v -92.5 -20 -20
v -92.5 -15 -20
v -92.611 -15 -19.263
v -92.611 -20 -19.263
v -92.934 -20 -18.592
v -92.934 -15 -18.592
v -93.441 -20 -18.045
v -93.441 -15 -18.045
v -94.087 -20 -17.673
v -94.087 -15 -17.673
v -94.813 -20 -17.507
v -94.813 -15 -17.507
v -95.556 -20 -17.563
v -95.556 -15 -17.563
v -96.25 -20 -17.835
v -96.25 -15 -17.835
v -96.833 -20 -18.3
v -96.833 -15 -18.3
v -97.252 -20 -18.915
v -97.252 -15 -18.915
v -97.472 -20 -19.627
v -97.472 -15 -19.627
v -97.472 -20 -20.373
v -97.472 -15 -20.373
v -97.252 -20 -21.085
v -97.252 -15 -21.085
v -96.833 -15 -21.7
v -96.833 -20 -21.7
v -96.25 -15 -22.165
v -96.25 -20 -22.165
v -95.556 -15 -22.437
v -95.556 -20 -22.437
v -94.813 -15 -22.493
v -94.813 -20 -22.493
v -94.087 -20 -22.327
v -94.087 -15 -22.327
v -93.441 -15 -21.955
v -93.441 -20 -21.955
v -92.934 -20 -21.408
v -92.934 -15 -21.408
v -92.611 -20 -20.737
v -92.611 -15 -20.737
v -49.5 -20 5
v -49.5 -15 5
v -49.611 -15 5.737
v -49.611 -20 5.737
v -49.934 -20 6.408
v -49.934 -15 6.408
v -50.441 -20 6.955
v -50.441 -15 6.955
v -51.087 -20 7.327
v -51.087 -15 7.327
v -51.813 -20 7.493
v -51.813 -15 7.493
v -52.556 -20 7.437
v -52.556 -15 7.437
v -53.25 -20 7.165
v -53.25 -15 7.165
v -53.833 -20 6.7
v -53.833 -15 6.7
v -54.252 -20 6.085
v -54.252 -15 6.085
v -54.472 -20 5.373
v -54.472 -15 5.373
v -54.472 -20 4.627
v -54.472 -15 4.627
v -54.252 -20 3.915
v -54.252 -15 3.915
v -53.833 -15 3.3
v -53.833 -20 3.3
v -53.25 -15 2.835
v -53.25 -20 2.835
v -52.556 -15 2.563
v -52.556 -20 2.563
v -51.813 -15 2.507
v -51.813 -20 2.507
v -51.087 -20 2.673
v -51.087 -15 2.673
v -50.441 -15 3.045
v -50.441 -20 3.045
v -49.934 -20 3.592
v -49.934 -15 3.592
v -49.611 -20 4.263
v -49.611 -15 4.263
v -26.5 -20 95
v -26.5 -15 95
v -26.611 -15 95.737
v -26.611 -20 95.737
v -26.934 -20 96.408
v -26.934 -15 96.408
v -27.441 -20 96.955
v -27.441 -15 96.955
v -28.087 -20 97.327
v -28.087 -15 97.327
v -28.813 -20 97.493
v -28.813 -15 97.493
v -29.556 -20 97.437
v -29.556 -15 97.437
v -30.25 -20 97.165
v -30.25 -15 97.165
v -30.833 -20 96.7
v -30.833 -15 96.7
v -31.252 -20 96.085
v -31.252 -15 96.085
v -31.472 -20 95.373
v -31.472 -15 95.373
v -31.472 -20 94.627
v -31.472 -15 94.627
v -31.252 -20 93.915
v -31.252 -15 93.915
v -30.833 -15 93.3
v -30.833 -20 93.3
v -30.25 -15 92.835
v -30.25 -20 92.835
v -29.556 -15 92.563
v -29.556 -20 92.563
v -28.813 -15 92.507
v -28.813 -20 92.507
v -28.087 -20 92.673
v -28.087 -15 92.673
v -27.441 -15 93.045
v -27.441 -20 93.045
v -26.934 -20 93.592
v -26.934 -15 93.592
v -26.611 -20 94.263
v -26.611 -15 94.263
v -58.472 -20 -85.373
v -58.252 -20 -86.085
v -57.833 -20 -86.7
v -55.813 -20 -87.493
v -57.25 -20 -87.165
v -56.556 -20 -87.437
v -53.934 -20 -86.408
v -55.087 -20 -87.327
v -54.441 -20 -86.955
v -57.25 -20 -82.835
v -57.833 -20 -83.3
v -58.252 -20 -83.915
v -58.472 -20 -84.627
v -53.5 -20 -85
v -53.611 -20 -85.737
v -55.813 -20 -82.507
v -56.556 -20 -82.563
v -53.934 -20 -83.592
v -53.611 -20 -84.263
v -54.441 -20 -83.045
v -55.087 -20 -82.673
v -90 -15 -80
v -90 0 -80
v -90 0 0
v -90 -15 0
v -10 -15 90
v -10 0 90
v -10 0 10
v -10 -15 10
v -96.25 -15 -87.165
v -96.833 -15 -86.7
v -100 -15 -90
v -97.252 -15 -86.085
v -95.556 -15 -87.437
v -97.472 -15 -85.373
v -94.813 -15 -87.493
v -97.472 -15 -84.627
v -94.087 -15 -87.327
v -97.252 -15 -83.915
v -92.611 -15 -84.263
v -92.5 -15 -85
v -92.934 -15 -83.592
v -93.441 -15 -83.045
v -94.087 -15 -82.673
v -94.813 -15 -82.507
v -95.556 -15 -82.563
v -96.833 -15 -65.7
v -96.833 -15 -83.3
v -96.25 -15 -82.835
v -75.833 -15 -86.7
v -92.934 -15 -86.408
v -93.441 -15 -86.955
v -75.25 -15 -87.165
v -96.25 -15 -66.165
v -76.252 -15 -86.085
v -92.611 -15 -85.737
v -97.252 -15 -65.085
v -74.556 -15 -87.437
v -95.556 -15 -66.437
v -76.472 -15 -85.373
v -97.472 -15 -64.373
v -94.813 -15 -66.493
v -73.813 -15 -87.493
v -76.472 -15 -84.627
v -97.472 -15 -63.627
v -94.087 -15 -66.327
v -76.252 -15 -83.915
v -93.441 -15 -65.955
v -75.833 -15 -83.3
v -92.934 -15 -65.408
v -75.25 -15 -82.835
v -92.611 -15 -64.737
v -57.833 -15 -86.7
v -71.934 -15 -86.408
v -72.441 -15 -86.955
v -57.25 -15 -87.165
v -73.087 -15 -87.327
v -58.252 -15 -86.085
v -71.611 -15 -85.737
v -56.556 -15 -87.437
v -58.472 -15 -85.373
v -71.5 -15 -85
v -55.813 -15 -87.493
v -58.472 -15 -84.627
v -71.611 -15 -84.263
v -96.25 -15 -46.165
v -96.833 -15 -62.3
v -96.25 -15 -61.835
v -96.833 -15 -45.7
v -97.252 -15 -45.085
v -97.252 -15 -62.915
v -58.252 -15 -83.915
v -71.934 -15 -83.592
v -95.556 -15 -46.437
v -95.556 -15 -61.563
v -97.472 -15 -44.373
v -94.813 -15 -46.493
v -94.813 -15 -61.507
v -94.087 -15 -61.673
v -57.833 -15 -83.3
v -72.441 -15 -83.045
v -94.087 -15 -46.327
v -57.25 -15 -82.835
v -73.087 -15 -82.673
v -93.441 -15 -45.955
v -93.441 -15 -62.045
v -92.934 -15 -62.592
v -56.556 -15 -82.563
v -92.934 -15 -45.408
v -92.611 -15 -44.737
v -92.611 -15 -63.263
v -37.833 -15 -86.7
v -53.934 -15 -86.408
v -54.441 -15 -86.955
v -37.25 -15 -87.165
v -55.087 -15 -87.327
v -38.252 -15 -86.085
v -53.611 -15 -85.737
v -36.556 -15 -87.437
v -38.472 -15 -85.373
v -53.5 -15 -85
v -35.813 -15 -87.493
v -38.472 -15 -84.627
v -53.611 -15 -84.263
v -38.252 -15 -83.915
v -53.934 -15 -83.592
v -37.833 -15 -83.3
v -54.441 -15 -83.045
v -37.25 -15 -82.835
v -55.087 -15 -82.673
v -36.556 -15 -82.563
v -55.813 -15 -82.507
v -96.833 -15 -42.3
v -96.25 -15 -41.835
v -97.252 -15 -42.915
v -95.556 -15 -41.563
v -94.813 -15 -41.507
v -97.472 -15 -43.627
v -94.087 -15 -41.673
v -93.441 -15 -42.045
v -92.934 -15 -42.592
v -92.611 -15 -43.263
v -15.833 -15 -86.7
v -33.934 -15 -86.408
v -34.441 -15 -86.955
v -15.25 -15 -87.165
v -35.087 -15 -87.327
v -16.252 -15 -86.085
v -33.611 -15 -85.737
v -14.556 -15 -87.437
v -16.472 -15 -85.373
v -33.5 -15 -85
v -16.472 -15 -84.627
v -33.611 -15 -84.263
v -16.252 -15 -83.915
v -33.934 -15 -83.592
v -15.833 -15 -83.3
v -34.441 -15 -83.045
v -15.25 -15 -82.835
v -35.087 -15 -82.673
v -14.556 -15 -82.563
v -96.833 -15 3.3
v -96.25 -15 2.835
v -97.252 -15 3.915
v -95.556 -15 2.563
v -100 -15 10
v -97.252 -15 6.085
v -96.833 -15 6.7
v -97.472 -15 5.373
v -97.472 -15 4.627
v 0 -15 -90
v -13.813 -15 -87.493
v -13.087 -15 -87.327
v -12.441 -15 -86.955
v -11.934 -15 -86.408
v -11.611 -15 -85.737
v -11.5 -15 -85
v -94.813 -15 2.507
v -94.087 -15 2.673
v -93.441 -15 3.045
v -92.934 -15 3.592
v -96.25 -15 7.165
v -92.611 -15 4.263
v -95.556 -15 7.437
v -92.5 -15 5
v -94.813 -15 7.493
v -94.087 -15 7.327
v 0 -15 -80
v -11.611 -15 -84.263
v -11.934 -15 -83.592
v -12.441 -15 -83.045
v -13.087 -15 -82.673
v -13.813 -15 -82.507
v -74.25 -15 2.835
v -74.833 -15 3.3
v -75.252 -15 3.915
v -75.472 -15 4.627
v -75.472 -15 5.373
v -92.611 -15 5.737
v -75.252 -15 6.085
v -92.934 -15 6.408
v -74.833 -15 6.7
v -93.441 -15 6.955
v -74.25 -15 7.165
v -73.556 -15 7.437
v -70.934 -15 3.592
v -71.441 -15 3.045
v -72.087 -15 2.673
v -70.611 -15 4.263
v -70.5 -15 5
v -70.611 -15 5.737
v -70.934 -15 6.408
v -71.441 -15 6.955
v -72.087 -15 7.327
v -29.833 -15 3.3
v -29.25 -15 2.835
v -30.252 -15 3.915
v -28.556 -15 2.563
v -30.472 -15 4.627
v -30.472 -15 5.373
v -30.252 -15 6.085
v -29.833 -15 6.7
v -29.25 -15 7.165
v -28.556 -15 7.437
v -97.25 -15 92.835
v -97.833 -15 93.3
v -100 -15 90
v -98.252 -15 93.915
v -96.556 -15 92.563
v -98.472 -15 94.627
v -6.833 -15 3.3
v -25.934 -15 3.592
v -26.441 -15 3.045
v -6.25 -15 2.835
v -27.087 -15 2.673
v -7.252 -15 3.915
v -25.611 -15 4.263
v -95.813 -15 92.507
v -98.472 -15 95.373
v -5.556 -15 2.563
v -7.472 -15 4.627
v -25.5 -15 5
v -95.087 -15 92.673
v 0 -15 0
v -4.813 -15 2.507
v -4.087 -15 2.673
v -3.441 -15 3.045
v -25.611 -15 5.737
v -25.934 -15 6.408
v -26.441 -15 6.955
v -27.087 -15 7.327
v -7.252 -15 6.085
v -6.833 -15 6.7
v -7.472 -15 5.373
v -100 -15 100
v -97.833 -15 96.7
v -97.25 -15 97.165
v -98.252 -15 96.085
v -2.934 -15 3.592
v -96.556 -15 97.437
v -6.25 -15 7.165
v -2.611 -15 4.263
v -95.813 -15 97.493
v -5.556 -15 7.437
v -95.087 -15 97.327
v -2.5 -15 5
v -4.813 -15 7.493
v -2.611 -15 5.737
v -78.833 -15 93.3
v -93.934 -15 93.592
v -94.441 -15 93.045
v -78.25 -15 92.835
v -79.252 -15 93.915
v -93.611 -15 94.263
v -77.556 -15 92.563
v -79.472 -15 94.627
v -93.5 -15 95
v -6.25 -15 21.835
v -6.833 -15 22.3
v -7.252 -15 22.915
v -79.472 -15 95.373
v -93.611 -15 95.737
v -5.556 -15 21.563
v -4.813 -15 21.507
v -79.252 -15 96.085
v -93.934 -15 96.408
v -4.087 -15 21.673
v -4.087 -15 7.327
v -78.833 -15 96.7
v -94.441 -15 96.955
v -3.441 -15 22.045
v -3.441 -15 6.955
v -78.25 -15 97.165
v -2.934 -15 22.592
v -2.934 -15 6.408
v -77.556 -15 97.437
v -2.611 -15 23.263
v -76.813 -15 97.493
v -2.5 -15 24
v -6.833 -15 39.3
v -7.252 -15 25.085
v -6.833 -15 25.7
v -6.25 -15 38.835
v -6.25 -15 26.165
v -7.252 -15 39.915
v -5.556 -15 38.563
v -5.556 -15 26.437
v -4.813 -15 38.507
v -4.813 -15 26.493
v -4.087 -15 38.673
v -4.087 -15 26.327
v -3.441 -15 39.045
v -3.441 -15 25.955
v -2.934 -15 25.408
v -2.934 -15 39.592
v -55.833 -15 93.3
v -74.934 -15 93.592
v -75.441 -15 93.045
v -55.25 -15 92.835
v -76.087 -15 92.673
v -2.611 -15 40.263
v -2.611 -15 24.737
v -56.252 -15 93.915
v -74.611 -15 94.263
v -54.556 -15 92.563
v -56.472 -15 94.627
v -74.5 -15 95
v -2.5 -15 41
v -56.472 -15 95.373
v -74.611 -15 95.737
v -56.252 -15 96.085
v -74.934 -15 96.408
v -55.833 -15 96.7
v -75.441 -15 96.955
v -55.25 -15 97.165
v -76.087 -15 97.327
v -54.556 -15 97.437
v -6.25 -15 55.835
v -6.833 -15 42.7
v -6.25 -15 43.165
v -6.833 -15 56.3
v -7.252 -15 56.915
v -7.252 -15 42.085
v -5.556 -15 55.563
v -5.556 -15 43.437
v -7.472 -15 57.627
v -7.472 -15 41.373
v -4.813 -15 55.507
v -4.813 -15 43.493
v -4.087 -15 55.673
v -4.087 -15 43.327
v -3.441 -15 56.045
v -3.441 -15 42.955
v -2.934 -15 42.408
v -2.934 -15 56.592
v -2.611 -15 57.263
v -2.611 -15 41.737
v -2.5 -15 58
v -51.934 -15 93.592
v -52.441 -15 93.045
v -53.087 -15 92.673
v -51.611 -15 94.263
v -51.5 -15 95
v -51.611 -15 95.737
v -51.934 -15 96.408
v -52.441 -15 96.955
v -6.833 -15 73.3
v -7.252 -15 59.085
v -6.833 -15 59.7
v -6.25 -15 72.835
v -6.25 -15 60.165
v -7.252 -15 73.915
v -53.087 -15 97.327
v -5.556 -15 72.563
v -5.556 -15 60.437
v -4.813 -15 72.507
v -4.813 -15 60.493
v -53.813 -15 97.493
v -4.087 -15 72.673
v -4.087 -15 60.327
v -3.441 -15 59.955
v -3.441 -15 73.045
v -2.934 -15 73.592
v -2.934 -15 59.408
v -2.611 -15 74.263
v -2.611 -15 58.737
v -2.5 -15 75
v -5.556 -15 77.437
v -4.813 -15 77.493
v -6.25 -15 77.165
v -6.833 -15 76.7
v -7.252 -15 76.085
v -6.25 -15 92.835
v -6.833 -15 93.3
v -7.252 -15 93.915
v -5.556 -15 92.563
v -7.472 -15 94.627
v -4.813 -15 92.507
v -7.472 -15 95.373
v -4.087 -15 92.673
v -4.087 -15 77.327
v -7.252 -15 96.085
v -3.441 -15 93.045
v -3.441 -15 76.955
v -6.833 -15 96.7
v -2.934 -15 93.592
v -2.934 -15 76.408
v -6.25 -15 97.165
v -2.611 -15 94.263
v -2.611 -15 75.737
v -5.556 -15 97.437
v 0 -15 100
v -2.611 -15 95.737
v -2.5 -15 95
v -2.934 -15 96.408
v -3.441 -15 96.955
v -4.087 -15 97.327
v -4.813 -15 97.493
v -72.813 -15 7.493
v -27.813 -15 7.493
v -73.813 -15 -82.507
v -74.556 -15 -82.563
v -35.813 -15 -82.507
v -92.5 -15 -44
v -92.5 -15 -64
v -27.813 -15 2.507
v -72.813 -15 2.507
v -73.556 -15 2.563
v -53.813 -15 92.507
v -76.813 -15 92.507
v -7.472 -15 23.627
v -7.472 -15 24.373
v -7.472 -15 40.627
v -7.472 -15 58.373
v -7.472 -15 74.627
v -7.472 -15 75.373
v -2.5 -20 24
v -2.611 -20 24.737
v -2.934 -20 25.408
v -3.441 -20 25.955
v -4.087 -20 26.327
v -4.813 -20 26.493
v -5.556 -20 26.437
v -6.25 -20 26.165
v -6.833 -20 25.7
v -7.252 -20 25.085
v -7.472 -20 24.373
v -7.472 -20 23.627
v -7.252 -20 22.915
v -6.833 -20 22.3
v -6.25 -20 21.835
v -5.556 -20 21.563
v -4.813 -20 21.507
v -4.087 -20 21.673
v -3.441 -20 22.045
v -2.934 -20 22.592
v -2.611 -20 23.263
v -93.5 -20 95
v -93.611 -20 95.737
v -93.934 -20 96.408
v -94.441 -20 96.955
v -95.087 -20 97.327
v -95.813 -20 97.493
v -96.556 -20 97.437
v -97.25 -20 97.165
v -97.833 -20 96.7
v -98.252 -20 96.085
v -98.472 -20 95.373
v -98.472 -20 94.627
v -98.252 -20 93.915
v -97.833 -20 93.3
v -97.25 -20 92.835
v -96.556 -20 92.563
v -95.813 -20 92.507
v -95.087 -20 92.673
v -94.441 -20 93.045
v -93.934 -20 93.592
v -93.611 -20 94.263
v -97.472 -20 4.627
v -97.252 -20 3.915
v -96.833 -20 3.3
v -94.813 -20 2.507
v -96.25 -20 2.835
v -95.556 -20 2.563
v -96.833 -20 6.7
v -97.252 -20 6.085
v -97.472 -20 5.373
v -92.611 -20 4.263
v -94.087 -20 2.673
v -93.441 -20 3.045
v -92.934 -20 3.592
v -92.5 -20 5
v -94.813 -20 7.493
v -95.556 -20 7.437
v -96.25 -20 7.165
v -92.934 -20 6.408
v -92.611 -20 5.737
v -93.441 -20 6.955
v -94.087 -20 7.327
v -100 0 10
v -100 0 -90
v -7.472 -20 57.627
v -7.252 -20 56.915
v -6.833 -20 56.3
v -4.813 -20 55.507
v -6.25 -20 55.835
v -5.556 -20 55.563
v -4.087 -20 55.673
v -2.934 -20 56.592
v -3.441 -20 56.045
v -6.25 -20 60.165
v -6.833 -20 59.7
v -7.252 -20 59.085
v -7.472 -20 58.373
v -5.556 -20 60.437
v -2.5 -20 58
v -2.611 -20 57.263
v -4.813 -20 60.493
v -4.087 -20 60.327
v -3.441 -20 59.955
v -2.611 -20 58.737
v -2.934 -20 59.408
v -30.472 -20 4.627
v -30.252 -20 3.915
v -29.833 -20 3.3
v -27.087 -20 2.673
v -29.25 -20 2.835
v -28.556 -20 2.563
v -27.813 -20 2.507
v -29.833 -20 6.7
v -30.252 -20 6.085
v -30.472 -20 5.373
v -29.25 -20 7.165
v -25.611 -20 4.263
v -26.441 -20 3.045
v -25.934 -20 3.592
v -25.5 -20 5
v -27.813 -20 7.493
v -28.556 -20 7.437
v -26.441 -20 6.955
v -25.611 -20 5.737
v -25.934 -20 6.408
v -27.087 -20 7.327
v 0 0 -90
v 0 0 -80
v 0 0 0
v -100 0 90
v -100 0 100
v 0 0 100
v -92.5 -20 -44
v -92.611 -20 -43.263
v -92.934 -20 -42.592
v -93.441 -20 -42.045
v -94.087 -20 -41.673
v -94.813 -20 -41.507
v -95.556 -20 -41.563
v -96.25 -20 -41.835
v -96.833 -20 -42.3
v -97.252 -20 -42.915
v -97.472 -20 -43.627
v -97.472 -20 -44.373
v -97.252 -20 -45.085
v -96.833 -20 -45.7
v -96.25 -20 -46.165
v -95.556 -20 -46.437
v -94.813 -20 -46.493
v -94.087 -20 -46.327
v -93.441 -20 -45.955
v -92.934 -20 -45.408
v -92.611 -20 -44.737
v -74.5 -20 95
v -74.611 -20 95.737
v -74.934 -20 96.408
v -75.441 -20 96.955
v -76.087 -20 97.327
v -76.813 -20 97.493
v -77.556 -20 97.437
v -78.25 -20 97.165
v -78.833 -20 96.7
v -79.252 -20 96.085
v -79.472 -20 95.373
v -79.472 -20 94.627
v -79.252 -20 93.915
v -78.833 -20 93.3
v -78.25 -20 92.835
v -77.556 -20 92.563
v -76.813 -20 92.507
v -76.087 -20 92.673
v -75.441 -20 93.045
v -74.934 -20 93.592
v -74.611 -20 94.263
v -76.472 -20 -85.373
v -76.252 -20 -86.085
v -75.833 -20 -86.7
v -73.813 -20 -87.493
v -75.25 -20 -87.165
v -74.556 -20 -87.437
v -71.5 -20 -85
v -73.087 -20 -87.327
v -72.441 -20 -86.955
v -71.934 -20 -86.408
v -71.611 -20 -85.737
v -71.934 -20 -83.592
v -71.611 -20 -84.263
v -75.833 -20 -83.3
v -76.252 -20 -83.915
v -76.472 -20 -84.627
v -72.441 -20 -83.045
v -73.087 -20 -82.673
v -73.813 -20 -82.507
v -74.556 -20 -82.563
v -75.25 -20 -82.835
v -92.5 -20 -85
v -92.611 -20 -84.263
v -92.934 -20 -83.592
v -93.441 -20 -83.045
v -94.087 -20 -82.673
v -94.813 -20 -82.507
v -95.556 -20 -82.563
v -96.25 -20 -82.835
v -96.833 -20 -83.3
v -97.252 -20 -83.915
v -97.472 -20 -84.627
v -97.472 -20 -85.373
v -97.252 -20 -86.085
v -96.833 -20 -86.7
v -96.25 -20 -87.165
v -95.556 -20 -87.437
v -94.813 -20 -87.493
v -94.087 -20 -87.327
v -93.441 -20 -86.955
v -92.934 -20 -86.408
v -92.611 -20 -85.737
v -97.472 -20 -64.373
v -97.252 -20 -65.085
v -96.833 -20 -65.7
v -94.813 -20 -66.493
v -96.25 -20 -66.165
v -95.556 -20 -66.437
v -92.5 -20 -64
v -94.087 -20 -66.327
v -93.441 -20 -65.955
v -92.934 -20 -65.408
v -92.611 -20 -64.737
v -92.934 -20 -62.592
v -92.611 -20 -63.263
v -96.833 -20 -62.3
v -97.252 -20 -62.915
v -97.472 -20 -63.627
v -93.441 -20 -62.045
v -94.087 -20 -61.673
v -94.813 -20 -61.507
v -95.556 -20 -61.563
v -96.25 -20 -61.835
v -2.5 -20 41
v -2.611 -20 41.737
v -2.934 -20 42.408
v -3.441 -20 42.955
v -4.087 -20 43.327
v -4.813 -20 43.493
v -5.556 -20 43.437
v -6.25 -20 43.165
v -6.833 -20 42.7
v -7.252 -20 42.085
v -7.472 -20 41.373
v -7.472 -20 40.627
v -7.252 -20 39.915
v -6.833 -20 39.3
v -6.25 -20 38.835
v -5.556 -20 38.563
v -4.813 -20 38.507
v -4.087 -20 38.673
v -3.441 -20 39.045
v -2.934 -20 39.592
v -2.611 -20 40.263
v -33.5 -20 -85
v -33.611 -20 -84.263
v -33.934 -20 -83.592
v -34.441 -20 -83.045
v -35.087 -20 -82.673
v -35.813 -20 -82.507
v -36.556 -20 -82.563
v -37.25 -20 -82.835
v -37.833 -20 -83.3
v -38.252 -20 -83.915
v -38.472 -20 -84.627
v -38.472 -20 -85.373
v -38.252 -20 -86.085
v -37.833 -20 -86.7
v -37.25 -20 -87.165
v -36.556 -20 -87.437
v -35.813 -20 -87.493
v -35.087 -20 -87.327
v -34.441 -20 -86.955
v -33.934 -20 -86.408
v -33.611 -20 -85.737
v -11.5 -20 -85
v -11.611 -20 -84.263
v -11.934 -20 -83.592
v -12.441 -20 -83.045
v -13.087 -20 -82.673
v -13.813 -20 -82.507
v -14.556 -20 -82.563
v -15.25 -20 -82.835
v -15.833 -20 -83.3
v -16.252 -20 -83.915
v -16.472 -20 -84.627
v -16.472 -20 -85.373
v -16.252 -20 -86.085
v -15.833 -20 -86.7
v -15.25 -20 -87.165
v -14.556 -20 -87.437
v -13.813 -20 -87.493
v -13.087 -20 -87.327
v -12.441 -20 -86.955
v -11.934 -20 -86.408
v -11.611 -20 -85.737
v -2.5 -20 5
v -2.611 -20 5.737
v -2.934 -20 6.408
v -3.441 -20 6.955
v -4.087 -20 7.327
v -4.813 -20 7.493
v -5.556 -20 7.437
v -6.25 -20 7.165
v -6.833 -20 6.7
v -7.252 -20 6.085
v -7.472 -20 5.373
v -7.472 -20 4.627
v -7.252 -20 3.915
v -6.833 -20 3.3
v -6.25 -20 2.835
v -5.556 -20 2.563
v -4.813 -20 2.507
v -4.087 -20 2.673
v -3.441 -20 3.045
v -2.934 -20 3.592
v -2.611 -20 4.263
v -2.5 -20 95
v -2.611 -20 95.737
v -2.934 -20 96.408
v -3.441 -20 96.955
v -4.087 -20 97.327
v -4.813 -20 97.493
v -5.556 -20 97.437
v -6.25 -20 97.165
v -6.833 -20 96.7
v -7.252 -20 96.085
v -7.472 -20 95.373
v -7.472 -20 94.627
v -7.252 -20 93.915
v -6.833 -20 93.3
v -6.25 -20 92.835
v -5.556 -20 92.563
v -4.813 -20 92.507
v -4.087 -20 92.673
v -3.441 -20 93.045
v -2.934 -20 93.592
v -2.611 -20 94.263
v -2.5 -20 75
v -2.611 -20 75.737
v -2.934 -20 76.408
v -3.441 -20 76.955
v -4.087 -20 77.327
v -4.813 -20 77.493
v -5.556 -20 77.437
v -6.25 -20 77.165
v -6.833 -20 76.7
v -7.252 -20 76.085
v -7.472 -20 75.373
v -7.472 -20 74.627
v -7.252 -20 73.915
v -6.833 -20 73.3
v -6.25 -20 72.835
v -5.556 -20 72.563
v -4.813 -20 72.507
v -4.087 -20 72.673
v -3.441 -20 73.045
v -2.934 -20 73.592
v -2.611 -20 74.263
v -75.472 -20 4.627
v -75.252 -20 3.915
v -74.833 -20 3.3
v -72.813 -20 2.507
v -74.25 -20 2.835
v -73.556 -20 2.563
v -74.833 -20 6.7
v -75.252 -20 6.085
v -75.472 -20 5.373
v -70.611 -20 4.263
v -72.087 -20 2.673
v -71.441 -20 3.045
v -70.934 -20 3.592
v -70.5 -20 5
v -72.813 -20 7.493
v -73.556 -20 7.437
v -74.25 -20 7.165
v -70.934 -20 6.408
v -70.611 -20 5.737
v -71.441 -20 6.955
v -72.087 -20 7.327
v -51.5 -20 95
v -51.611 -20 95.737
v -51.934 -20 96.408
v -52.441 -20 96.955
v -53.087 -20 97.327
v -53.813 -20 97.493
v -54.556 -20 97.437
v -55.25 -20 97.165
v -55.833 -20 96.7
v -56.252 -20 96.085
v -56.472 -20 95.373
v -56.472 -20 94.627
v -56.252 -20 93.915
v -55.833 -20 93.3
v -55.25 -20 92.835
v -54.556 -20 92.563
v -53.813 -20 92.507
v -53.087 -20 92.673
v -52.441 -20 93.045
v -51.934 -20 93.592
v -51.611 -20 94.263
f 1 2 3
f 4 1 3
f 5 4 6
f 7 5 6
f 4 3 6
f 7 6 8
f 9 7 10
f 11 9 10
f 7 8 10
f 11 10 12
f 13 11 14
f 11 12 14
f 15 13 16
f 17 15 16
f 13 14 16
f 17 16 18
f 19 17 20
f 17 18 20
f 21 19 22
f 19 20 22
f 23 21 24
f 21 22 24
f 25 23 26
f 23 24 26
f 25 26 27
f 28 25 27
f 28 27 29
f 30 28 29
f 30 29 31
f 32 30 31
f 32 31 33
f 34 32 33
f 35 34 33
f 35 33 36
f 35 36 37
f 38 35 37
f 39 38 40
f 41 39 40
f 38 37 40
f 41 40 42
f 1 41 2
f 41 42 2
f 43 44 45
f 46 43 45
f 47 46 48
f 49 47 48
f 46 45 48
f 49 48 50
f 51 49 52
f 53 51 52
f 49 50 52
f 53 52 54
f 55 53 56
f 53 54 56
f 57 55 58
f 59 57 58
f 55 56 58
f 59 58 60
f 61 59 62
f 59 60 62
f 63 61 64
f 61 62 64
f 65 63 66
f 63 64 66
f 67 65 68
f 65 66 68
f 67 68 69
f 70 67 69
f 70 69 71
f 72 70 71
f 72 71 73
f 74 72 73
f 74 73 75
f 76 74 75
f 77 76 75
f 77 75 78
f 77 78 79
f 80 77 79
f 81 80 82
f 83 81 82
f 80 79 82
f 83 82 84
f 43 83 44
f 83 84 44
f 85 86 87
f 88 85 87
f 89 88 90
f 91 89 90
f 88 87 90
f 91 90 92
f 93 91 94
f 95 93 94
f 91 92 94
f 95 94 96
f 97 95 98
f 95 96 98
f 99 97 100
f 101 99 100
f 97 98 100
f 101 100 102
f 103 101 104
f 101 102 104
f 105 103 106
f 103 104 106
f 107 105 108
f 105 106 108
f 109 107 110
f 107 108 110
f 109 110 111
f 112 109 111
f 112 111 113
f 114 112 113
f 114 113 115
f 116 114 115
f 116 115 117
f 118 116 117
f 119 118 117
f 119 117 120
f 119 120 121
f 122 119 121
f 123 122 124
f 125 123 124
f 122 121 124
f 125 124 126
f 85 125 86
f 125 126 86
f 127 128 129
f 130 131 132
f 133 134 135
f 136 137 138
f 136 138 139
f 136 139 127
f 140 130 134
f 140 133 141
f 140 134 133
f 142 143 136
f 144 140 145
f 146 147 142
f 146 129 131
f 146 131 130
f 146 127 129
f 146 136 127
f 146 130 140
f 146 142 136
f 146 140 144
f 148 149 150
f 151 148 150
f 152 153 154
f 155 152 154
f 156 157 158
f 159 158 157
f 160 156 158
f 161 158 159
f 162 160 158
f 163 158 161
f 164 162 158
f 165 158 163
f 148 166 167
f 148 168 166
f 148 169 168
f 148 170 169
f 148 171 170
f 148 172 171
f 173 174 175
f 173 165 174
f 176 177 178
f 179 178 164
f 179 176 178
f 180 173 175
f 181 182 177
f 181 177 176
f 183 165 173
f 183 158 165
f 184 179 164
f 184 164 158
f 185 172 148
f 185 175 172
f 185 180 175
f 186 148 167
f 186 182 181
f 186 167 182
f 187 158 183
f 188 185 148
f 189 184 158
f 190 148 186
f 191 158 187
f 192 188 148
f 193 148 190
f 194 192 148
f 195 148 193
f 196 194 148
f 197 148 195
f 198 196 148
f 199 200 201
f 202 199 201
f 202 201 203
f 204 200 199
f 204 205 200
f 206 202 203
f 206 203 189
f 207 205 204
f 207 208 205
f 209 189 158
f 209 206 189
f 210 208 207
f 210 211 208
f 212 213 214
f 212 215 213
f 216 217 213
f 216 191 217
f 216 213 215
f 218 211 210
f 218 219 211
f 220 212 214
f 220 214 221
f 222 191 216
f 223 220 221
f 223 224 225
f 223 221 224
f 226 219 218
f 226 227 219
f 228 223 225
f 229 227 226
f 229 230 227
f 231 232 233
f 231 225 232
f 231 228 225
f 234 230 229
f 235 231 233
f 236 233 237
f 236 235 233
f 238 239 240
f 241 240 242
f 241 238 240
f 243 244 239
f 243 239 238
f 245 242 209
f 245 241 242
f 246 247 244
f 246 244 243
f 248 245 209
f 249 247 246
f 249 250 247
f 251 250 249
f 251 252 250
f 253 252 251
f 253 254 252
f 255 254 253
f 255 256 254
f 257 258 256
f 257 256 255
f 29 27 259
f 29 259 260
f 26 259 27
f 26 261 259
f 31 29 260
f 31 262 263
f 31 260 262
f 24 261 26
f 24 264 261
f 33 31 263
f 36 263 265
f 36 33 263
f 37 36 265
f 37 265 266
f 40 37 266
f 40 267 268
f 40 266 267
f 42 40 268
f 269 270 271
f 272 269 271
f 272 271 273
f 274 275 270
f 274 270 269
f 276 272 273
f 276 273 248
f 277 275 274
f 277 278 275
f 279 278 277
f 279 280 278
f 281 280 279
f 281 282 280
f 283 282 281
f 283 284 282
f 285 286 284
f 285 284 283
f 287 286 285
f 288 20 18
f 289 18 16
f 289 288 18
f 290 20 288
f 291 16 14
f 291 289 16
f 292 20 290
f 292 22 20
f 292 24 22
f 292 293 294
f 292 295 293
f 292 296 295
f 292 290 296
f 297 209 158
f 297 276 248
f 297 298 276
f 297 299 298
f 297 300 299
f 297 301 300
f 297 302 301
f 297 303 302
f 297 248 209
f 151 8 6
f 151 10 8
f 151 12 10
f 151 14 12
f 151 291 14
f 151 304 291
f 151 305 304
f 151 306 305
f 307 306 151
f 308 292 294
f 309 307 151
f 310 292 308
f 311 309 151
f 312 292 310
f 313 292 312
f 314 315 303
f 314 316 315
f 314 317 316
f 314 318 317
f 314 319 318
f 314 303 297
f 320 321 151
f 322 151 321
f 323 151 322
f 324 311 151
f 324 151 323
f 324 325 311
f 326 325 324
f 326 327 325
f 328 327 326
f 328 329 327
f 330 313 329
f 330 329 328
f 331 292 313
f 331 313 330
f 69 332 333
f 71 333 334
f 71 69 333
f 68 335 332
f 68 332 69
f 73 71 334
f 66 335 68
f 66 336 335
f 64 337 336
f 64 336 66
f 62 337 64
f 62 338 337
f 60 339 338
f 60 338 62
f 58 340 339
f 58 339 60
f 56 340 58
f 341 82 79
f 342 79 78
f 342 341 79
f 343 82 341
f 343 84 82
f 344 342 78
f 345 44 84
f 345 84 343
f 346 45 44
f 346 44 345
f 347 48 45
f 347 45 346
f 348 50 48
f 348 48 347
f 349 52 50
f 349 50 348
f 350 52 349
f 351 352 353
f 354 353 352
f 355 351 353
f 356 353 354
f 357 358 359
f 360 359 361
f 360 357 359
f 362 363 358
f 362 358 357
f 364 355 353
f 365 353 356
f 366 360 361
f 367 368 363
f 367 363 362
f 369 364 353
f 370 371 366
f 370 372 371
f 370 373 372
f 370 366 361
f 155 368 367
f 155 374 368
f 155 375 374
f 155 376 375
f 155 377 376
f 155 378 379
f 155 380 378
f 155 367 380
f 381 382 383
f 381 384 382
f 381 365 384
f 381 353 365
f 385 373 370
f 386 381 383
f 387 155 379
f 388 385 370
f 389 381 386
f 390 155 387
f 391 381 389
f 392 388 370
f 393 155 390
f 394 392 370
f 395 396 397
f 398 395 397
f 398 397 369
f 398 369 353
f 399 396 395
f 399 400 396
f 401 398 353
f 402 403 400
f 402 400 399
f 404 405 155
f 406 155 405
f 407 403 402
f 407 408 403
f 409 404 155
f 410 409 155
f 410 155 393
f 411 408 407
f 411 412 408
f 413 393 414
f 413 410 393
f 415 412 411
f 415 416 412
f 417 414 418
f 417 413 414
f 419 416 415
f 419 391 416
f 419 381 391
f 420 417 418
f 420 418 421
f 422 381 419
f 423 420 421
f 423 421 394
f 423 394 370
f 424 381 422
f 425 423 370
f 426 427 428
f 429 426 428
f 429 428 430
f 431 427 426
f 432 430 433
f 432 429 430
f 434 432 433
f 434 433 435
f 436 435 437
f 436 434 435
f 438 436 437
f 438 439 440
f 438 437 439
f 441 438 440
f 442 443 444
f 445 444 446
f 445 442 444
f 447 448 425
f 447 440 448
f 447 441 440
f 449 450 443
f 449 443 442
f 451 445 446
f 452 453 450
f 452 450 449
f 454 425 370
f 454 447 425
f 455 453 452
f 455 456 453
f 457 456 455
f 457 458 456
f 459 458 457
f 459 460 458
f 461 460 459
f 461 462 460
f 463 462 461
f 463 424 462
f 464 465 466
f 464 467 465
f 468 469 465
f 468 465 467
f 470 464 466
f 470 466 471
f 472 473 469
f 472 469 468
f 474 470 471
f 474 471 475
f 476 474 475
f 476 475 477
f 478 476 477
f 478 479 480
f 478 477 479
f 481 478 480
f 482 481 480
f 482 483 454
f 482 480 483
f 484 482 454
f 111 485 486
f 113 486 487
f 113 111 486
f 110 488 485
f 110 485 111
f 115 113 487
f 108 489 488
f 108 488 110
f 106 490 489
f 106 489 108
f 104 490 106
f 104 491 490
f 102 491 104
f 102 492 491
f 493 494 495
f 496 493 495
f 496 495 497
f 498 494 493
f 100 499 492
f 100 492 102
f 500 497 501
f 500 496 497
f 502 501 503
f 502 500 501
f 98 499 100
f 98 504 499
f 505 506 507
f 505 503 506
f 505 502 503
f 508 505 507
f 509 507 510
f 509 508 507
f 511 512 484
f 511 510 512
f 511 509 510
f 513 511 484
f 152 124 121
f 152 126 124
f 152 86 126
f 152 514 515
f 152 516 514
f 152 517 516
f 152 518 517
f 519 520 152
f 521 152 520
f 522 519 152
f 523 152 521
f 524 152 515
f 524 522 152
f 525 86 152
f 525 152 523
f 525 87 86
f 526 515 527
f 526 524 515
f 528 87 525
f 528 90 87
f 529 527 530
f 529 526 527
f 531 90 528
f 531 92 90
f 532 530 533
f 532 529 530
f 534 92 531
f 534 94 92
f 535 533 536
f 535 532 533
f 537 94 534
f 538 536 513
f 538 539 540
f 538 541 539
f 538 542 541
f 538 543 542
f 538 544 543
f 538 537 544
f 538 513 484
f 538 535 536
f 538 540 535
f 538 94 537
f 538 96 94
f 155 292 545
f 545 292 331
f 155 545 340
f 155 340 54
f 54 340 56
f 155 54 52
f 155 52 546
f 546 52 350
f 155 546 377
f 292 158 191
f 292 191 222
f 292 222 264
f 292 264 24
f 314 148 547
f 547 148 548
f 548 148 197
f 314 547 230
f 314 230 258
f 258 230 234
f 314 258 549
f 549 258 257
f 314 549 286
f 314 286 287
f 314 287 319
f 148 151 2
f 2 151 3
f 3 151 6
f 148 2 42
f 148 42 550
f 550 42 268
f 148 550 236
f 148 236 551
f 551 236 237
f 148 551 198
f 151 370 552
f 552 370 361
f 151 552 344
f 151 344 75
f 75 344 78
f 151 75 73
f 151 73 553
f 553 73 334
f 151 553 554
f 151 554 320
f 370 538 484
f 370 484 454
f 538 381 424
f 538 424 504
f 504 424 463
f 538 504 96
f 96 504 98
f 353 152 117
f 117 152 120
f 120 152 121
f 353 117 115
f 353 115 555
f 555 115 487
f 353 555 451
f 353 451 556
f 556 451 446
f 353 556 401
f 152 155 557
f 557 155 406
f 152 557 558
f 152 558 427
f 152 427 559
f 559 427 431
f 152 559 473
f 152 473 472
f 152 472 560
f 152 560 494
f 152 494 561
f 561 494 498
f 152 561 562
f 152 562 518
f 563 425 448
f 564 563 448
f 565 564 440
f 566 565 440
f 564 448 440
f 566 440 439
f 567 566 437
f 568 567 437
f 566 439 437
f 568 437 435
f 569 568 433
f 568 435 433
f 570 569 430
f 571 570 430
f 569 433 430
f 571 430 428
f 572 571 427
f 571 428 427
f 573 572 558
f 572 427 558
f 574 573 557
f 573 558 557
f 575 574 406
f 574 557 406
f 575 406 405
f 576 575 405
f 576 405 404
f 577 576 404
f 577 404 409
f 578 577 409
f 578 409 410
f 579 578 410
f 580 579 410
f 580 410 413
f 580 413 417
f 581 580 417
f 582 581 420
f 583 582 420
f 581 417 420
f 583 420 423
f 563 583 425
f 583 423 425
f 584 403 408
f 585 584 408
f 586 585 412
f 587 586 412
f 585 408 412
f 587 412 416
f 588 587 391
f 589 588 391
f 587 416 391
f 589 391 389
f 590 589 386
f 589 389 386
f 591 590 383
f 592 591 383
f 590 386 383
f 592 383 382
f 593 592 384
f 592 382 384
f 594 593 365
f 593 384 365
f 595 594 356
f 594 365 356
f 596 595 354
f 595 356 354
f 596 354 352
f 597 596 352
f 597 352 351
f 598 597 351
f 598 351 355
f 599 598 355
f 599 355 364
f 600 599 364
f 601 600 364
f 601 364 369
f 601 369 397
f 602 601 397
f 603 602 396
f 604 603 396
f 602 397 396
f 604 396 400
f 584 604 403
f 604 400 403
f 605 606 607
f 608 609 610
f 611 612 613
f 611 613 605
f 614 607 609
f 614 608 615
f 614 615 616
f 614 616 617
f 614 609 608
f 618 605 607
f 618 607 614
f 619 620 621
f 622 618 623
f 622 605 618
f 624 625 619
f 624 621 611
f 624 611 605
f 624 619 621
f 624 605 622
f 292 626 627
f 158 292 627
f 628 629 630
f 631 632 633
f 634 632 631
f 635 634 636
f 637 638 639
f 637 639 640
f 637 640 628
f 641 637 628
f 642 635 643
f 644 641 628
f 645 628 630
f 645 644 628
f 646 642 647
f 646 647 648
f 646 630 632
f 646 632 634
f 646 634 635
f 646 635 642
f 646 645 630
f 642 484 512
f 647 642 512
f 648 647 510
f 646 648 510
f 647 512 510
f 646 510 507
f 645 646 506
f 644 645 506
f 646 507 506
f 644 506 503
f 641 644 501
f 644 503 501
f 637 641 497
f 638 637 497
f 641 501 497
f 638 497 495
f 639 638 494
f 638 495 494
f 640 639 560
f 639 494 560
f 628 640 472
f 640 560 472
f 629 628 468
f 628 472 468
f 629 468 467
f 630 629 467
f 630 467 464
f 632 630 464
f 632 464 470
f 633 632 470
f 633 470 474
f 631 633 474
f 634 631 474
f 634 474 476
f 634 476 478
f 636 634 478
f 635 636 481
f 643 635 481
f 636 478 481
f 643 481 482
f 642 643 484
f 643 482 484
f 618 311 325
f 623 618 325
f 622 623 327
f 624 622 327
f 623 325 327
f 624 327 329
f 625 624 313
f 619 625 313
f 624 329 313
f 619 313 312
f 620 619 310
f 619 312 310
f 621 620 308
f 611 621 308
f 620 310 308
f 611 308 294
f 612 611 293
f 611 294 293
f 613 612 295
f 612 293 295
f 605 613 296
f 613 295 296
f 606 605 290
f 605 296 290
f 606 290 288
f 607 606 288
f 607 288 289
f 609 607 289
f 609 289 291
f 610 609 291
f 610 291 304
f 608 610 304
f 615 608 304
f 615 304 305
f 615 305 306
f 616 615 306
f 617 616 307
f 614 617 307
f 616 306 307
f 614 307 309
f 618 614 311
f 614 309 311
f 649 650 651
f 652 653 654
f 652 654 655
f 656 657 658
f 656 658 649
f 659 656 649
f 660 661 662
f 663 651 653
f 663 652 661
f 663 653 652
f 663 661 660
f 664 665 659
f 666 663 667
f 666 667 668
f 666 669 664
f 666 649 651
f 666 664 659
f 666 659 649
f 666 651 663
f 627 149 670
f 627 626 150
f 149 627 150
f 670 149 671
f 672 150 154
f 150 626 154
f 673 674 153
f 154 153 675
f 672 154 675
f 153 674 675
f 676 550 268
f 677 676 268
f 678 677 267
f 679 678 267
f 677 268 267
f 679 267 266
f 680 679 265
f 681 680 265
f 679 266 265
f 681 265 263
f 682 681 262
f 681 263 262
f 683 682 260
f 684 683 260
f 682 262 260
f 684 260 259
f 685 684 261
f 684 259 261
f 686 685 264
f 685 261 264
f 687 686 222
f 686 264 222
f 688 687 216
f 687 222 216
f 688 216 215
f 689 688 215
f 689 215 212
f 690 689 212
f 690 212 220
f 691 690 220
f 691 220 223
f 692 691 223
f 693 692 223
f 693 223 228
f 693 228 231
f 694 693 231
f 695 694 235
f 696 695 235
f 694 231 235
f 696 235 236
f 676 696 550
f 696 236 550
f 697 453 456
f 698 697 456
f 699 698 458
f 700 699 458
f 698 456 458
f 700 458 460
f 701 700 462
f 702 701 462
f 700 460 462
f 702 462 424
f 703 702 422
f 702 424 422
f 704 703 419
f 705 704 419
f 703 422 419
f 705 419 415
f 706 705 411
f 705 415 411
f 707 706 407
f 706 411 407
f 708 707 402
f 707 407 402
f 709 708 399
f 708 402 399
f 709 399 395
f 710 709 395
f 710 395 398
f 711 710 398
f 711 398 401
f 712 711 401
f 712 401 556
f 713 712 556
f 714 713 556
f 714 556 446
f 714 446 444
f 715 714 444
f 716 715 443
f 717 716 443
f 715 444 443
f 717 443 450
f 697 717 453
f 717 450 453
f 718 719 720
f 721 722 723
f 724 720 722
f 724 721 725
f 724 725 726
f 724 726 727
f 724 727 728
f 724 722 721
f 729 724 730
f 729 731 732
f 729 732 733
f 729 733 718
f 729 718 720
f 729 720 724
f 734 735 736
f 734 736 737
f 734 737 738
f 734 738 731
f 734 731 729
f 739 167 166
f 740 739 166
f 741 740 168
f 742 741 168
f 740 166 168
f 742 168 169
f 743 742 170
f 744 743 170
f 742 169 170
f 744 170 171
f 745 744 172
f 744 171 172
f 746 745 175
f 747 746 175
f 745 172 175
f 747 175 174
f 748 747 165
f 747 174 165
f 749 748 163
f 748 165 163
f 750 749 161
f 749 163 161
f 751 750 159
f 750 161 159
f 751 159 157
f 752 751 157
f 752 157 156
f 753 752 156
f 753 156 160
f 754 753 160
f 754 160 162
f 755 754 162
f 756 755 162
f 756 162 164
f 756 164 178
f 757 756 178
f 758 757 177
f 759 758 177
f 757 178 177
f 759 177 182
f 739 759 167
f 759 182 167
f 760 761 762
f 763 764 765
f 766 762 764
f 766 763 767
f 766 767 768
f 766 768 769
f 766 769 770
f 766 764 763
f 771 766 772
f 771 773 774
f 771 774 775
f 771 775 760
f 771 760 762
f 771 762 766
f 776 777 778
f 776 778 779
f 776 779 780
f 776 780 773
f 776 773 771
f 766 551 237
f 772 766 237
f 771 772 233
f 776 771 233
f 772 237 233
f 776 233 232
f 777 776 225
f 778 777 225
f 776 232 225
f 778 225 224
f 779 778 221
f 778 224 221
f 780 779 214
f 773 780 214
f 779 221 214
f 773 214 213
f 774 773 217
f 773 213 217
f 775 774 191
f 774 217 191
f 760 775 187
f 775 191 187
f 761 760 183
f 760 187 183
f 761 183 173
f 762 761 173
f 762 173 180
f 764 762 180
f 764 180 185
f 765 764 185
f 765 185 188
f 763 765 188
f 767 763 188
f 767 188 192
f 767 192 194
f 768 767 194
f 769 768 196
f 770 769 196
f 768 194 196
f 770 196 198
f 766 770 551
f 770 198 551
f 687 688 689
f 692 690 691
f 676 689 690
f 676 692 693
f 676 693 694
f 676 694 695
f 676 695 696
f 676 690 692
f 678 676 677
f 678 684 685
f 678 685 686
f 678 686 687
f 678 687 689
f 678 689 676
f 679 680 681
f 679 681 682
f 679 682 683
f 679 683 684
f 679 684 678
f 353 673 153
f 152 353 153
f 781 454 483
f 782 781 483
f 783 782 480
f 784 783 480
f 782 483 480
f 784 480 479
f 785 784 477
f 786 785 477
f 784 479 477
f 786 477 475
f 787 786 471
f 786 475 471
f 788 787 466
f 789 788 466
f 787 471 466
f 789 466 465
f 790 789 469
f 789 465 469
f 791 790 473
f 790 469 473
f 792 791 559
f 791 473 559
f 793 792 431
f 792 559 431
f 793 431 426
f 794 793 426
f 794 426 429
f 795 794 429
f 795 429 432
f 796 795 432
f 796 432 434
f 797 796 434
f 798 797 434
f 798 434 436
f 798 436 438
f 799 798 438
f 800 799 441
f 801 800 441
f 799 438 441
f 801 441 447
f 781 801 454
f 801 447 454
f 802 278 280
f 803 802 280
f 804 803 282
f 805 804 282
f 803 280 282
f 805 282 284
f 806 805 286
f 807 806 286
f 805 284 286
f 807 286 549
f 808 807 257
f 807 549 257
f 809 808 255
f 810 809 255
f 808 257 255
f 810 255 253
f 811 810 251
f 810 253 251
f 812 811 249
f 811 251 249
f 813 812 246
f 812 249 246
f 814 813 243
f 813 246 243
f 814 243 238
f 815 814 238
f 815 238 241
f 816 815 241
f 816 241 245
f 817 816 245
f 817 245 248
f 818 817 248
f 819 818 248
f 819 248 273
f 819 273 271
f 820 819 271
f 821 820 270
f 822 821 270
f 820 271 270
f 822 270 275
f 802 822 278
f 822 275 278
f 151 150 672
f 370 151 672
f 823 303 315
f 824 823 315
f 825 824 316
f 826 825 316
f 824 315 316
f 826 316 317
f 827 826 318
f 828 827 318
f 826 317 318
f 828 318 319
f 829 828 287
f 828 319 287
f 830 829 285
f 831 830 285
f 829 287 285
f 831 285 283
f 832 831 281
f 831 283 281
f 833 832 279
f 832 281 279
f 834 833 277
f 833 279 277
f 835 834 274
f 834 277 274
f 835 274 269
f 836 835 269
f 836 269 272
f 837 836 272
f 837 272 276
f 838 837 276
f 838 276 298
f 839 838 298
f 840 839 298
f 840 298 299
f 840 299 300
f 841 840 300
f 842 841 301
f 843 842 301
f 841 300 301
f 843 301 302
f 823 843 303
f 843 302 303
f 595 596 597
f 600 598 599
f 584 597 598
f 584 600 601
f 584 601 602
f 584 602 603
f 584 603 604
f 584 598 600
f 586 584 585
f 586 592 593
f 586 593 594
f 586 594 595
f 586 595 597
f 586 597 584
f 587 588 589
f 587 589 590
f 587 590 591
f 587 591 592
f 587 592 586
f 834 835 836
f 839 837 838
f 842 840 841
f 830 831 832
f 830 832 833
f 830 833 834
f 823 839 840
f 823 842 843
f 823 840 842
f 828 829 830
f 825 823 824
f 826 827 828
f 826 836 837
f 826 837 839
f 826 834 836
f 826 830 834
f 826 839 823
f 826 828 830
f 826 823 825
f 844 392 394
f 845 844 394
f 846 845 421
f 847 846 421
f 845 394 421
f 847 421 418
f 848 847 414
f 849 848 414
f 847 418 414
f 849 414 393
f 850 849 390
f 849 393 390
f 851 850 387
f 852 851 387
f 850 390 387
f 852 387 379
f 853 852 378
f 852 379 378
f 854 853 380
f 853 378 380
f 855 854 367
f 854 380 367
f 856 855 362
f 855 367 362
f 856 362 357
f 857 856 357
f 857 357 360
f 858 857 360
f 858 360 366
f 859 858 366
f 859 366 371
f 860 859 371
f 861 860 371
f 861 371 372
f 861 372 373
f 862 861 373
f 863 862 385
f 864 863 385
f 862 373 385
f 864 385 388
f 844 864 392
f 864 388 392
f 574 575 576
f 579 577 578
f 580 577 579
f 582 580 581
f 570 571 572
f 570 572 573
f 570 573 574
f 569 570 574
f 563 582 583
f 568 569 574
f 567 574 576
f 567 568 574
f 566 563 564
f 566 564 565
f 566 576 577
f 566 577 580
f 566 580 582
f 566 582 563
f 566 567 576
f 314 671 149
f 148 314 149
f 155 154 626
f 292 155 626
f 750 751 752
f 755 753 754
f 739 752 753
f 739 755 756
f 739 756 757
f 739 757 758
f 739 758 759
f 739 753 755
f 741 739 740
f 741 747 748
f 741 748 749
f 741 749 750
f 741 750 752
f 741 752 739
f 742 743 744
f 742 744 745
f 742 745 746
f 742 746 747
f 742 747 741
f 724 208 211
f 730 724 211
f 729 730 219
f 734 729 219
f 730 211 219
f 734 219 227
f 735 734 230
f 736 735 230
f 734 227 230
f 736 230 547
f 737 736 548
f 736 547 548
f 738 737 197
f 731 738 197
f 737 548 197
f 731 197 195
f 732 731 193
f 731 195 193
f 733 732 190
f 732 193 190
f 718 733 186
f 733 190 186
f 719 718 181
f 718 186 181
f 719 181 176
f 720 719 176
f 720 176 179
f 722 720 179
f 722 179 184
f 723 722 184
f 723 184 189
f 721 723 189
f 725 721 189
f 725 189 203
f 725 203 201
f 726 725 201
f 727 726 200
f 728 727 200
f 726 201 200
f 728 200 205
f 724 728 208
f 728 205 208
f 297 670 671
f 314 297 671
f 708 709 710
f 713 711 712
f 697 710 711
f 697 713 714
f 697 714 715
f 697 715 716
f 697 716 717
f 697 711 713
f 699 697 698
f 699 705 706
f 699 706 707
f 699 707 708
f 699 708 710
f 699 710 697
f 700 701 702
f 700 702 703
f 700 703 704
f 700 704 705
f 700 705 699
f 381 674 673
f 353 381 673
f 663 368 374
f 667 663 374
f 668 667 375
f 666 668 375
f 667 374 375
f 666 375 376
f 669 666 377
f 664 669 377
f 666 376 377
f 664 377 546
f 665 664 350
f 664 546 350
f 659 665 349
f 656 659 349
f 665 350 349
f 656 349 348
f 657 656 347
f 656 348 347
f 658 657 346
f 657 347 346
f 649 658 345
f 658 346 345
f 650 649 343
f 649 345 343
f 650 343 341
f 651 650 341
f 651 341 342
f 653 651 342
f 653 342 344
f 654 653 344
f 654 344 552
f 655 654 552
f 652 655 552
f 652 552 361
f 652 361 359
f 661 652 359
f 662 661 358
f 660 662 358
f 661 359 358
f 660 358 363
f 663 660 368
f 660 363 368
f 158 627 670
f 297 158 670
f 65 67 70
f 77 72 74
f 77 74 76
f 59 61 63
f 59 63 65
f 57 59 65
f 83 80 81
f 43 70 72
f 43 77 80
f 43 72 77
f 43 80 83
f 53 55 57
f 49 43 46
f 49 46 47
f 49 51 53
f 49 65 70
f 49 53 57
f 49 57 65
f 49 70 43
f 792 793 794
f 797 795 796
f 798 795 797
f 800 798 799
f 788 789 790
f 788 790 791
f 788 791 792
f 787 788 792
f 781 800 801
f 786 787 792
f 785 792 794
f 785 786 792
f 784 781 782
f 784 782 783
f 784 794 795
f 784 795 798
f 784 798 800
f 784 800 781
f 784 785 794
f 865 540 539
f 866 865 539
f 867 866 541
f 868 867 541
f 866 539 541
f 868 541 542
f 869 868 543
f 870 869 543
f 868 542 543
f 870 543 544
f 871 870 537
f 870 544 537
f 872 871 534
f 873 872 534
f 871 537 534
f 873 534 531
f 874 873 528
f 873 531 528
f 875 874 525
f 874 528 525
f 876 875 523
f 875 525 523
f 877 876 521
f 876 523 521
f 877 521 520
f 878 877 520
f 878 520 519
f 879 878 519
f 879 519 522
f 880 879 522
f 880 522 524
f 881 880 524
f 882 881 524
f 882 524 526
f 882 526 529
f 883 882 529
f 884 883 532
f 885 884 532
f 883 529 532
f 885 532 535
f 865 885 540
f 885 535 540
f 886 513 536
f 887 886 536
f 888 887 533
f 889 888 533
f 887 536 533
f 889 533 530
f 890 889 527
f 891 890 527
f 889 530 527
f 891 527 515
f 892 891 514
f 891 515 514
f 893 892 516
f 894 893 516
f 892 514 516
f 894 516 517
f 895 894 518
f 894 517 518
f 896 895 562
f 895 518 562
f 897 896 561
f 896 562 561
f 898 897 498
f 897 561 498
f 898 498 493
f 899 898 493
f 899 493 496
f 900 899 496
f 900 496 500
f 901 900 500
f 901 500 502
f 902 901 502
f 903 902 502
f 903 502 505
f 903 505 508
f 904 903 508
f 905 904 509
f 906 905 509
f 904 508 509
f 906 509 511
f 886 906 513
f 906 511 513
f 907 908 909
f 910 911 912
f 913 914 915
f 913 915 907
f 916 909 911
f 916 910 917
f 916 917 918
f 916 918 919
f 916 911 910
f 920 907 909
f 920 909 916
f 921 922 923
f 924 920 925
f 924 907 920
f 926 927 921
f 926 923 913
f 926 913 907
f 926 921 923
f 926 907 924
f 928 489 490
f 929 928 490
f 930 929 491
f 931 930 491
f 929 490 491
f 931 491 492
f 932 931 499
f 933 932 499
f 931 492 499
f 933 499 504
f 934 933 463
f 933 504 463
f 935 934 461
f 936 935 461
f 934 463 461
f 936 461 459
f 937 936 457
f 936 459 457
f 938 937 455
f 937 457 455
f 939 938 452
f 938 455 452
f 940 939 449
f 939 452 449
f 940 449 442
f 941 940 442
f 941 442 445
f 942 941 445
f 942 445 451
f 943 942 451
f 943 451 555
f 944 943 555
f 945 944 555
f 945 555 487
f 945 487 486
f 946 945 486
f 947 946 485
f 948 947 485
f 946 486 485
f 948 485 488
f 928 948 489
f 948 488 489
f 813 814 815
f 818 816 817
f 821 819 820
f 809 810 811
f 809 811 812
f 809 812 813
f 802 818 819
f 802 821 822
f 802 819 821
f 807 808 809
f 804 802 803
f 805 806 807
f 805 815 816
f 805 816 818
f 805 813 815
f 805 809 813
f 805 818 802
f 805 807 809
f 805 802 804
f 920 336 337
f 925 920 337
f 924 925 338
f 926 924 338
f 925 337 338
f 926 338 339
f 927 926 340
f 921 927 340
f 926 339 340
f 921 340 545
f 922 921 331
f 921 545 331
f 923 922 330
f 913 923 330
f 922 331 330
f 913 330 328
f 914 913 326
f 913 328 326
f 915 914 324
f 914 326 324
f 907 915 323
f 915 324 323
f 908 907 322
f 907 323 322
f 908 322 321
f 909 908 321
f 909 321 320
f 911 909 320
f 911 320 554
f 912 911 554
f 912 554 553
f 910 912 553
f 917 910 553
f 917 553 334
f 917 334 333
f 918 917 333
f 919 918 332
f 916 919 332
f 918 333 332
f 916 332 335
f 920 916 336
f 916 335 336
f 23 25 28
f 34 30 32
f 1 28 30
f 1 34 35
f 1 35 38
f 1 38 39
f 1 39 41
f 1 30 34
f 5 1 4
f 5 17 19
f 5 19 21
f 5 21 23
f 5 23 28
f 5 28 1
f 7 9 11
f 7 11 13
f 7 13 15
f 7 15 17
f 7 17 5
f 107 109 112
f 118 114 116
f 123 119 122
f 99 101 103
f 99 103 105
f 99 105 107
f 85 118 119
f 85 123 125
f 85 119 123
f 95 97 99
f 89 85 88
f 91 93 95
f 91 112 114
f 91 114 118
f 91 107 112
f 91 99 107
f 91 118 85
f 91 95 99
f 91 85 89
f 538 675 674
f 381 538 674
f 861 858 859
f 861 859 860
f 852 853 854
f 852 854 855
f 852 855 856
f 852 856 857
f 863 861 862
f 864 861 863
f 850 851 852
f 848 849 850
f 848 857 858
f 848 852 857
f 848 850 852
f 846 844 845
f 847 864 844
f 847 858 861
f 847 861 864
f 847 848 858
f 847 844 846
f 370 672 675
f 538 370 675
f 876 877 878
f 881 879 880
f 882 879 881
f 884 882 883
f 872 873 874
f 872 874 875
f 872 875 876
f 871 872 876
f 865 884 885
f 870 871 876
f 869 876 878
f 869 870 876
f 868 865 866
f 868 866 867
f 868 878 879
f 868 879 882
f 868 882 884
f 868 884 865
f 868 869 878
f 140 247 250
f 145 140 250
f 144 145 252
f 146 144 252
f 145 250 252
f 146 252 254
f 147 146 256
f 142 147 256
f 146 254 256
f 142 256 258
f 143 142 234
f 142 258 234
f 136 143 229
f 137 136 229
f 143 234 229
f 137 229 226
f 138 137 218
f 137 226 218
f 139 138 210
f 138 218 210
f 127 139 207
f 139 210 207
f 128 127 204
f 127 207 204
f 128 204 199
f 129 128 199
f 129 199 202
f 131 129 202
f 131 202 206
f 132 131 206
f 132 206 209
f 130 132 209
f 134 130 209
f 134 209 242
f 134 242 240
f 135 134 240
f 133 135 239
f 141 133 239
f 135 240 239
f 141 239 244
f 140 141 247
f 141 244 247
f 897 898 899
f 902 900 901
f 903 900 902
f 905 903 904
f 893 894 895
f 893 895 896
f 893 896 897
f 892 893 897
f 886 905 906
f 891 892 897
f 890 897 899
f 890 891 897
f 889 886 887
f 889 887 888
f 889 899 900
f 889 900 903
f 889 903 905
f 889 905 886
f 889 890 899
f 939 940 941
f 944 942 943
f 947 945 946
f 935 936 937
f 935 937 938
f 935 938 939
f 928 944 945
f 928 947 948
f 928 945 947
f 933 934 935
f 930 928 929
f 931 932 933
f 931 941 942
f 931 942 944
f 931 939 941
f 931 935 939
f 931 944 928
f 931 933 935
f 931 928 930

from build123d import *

# Parameters (mm, degrees)
F1_DEPTH = 15
F2_R     = 2.5
F3_DEPTH = 5


with BuildPart() as f1:
    # F0 (on Front) → F1 (new body)
    with BuildSketch(Plane.XZ):
        Polygon((-10, 10), (-100, 10), (-100, -90), (0, -90), (0, -80), (-90, -80), (-90, 0), (0, 0), (0, 100), (-100, 100), (-100, 90), (-10, 90), align=None)
    extrude(amount=F1_DEPTH)

    # F2 (on face) → F3 (join)
    with BuildSketch(Plane.XZ.offset(15)):
        with Locations((-14, -85)):
            Circle(F2_R)
        with Locations((-36, -85)):
            Circle(F2_R)
        with Locations((-56, -85)):
            Circle(F2_R)
        with Locations((-74, -85)):
            Circle(F2_R)
        with Locations((-95, -85)):
            Circle(F2_R)
        with Locations((-95, -64)):
            Circle(F2_R)
        with Locations((-95, -44)):
            Circle(F2_R)
        with Locations((-95, -20)):
            Circle(F2_R)
        with Locations((-95, 5)):
            Circle(F2_R)
        with Locations((-73, 5)):
            Circle(F2_R)
        with Locations((-52, 5)):
            Circle(F2_R)
        with Locations((-28, 5)):
            Circle(F2_R)
        with Locations((-5, 5)):
            Circle(F2_R)
        with Locations((-5, 24)):
            Circle(F2_R)
        with Locations((-5, 41)):
            Circle(F2_R)
        with Locations((-5, 58)):
            Circle(F2_R)
        with Locations((-5, 75)):
            Circle(F2_R)
        with Locations((-5, 95)):
            Circle(F2_R)
        with Locations((-96, 95)):
            Circle(F2_R)
        with Locations((-77, 95)):
            Circle(F2_R)
        with Locations((-54, 95)):
            Circle(F2_R)
        with Locations((-29, 95)):
            Circle(F2_R)
    extrude(amount=F3_DEPTH)


solid = f1.part
